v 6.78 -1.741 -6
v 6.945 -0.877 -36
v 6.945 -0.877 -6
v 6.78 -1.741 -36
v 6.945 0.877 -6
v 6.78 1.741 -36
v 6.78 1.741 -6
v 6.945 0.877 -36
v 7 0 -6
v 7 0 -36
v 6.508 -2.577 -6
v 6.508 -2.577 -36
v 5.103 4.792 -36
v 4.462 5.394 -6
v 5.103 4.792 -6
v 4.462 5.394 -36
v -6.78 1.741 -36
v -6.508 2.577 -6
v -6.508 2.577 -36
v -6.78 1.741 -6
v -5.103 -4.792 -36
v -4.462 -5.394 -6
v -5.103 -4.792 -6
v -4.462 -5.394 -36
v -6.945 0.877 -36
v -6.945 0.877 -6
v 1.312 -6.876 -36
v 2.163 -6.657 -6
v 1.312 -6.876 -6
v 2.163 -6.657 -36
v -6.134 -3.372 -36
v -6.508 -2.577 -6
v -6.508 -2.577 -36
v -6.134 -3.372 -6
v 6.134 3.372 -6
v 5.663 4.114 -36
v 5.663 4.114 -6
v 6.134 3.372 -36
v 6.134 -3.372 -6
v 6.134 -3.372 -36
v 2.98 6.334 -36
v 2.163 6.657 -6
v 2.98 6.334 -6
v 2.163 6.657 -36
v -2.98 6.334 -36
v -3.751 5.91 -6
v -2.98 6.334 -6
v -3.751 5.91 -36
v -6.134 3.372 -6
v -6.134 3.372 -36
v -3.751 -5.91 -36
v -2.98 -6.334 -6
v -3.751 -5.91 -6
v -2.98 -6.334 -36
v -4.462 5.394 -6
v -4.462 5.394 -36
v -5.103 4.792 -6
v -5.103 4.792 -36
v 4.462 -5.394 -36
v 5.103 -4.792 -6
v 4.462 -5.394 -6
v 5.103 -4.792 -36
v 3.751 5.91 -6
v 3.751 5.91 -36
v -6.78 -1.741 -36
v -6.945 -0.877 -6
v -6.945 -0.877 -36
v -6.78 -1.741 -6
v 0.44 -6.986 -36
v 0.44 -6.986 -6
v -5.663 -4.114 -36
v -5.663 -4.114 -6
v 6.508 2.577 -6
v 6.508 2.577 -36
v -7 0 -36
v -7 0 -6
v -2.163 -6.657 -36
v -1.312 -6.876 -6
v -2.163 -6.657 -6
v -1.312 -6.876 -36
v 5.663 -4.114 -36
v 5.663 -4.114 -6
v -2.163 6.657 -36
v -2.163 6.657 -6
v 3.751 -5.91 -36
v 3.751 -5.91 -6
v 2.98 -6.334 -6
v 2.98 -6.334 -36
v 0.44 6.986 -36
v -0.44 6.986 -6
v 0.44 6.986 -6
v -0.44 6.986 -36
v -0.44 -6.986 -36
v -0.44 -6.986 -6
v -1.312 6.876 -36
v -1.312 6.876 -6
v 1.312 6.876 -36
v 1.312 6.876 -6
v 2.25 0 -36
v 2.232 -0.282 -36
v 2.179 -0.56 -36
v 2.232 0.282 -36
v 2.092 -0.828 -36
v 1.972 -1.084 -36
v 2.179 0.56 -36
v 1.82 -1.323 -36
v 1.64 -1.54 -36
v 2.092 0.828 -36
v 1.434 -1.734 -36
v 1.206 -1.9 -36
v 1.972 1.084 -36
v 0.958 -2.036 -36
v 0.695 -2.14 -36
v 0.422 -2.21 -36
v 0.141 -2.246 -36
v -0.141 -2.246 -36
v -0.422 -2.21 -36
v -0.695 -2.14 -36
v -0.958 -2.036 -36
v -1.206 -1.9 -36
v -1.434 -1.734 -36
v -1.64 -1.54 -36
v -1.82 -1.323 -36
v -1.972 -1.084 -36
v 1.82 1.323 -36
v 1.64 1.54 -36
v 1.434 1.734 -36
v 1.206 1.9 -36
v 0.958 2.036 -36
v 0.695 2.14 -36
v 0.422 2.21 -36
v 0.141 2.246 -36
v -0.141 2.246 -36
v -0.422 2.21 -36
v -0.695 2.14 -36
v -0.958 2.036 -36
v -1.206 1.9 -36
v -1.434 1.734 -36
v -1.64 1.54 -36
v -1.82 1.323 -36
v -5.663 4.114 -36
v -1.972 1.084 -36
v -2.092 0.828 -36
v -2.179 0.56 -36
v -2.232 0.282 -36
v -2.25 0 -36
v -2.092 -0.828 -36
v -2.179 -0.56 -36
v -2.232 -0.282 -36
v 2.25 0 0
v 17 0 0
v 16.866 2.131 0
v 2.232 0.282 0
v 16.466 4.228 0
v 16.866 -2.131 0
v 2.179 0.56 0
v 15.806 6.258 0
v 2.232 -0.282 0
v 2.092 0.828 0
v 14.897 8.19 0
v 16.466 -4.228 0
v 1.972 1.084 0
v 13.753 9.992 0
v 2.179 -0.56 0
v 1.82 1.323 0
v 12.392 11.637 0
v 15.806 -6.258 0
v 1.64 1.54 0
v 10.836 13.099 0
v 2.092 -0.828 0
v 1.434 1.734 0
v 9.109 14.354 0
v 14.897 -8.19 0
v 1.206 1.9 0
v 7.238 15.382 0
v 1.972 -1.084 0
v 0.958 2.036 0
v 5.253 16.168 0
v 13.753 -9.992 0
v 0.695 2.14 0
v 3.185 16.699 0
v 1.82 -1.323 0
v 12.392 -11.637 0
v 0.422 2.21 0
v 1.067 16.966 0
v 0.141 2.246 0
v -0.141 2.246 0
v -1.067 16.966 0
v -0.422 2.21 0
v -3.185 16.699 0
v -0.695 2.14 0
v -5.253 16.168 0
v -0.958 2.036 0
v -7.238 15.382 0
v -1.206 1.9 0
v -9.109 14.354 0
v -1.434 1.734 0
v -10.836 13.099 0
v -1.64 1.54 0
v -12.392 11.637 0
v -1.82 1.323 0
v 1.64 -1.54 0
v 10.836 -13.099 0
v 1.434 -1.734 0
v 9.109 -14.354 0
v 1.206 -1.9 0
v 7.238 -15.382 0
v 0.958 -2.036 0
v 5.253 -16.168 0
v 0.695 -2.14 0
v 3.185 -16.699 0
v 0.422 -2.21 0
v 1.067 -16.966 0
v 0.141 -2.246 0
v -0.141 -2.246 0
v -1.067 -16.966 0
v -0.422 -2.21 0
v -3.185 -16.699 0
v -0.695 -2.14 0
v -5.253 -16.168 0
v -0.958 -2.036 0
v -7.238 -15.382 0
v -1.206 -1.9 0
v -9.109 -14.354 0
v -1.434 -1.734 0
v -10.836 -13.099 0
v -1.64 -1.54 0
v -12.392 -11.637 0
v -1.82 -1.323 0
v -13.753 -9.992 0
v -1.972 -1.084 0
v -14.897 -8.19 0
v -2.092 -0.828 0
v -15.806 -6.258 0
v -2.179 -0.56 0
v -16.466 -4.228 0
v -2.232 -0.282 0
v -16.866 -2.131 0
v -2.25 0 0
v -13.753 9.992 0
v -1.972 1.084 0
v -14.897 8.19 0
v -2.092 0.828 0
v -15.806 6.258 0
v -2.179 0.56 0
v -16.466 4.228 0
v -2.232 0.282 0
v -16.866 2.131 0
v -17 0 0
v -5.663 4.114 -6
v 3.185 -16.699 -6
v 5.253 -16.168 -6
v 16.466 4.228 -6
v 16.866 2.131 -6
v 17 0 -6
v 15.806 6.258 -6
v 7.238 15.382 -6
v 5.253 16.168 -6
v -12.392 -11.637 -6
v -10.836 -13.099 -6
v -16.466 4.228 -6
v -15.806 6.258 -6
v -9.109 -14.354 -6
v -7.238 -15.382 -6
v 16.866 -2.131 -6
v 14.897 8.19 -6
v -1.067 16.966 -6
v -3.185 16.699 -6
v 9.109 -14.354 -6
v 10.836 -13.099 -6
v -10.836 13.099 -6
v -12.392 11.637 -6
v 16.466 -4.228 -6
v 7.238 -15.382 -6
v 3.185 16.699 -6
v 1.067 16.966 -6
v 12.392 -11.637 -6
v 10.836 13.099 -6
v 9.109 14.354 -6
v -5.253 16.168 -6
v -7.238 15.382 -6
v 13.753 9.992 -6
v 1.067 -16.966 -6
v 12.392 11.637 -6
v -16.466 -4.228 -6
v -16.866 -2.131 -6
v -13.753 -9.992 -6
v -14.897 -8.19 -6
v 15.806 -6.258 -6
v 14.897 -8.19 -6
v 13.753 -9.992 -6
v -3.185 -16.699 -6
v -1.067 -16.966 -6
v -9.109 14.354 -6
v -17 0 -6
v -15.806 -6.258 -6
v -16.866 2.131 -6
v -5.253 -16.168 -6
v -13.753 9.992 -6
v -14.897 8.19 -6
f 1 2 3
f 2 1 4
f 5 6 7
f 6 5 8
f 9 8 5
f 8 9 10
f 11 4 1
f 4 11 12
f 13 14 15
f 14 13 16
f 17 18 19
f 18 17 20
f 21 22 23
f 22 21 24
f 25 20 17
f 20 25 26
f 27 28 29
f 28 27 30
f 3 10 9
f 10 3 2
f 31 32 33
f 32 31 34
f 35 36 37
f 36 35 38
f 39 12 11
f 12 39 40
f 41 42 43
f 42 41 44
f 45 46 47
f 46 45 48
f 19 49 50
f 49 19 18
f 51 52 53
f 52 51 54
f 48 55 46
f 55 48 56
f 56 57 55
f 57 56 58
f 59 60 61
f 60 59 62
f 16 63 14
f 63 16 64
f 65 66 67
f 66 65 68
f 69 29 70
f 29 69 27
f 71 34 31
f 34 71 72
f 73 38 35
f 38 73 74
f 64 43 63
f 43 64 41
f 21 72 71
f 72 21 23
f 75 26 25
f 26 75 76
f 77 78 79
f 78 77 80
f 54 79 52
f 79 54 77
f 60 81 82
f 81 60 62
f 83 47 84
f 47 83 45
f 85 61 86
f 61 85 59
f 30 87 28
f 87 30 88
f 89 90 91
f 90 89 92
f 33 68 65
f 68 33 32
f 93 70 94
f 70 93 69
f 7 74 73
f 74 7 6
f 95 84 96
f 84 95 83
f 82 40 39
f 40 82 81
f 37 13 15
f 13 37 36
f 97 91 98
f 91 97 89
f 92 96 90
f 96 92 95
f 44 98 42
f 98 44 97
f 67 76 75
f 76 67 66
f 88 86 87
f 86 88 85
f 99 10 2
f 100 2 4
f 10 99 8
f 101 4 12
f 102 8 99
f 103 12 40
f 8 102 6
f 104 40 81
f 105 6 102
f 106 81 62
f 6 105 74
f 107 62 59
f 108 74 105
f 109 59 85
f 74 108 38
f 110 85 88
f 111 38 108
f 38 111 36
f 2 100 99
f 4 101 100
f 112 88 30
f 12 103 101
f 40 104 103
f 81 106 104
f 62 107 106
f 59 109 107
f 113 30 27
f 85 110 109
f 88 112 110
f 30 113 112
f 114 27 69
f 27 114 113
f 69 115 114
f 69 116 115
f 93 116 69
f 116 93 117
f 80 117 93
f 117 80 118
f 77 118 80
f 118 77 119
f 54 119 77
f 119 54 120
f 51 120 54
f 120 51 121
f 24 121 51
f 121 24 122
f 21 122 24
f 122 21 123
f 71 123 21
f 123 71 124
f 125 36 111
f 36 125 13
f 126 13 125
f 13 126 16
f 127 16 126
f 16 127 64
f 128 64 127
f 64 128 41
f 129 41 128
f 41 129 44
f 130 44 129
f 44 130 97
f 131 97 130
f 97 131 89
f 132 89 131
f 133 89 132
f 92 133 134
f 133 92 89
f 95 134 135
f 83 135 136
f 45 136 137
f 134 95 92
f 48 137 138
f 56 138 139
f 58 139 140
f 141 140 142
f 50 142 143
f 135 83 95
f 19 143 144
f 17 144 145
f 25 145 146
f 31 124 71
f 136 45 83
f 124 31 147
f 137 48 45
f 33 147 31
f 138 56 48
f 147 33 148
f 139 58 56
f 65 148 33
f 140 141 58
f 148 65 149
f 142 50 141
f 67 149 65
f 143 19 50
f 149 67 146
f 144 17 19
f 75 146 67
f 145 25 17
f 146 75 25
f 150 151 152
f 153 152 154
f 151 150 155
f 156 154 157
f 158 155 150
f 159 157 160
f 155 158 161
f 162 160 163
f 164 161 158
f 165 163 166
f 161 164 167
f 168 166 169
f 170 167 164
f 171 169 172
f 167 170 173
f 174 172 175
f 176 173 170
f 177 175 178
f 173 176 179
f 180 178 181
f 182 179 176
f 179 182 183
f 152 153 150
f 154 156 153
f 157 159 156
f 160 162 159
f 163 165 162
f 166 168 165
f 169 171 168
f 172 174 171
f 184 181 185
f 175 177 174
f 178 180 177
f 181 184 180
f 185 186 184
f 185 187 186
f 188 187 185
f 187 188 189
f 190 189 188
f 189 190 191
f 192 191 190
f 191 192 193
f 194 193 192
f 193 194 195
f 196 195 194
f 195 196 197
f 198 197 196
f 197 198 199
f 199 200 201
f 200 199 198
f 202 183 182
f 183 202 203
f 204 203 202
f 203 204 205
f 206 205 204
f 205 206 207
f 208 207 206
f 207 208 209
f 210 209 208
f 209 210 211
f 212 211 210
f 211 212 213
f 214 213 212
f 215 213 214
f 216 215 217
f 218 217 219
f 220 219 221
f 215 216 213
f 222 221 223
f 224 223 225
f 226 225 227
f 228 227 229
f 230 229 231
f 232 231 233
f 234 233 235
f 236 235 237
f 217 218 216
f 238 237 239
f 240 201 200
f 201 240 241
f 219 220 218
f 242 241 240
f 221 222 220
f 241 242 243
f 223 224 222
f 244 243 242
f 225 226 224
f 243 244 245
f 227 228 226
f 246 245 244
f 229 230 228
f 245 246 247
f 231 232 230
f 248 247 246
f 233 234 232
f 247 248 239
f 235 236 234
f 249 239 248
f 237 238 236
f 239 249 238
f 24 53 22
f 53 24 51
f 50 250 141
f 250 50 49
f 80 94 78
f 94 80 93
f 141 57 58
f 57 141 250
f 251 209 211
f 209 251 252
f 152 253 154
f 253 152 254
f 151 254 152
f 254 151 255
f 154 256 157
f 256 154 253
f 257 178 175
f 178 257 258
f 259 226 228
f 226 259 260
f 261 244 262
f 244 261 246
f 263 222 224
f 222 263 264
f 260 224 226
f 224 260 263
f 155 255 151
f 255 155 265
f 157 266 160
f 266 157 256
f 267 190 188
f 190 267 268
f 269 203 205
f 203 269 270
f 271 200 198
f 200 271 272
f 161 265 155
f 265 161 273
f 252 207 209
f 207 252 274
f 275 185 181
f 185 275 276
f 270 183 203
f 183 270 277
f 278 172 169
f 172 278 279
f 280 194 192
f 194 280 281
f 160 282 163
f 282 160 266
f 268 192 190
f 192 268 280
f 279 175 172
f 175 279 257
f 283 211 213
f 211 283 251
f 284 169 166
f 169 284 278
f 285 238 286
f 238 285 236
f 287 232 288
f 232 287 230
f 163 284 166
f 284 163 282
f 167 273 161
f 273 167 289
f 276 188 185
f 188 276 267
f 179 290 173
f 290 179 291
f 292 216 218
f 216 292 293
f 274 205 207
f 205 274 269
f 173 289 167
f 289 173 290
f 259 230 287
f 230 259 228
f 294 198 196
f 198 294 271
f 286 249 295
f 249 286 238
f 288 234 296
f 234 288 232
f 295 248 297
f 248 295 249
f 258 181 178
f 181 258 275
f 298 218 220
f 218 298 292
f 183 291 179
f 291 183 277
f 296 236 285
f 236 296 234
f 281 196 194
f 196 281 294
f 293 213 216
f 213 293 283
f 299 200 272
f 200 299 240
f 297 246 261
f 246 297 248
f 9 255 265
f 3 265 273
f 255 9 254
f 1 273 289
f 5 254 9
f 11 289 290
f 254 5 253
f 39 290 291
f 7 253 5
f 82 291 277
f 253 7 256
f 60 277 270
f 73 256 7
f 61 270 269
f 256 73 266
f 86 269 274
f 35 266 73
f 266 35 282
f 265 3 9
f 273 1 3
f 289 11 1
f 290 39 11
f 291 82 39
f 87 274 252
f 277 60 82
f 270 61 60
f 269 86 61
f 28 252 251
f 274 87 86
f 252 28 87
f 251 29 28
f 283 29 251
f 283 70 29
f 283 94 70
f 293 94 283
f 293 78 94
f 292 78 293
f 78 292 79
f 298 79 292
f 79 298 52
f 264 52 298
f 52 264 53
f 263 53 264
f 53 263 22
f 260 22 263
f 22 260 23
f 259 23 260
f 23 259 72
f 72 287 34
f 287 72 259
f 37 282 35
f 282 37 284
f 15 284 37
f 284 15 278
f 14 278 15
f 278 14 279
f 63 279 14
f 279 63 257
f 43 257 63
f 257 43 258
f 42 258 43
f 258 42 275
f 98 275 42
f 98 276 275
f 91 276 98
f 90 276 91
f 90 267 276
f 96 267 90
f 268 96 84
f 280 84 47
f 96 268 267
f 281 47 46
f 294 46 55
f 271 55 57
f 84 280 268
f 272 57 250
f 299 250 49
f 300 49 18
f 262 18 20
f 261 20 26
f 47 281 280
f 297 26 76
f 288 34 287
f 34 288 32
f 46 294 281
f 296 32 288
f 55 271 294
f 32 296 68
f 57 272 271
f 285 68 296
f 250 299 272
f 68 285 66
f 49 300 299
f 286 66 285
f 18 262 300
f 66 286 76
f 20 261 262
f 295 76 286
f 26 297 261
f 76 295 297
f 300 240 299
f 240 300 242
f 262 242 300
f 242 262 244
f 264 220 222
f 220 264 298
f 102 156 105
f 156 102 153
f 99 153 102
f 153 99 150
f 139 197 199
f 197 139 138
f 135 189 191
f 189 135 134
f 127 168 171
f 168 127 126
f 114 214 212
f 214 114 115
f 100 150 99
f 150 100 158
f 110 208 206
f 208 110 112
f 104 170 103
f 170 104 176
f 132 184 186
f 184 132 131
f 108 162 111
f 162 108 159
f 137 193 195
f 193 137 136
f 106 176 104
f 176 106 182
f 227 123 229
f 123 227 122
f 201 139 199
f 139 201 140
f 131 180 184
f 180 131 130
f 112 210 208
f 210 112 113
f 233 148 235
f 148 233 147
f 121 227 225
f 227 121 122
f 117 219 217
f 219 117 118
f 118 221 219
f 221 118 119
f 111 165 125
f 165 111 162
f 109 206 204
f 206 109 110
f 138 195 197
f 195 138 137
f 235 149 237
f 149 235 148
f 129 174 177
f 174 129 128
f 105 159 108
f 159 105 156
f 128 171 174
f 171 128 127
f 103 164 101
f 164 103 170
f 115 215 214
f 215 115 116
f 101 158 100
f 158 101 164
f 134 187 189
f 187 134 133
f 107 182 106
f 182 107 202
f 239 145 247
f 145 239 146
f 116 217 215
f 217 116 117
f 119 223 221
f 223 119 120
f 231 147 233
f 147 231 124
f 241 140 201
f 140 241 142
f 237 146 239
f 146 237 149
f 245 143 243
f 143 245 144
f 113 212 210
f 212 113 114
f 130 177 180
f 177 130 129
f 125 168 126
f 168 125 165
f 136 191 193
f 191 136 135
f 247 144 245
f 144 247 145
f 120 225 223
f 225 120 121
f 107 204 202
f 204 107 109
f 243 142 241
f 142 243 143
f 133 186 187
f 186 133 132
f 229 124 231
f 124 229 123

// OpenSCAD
$fn = 50;


difference() {
	union() {
		translate(v = [0, 0, -36.0000000000]) {
			cylinder(h = 36, r = 7.0000000000);
		}
		translate(v = [0, 0, -6.0000000000]) {
			cylinder(h = 6, r = 17.0000000000);
		}
	}
	union() {
		#translate(v = [0, 0, -36]) {
			cylinder(h = 36, r = 2.2500000000);
		}
	}
}
